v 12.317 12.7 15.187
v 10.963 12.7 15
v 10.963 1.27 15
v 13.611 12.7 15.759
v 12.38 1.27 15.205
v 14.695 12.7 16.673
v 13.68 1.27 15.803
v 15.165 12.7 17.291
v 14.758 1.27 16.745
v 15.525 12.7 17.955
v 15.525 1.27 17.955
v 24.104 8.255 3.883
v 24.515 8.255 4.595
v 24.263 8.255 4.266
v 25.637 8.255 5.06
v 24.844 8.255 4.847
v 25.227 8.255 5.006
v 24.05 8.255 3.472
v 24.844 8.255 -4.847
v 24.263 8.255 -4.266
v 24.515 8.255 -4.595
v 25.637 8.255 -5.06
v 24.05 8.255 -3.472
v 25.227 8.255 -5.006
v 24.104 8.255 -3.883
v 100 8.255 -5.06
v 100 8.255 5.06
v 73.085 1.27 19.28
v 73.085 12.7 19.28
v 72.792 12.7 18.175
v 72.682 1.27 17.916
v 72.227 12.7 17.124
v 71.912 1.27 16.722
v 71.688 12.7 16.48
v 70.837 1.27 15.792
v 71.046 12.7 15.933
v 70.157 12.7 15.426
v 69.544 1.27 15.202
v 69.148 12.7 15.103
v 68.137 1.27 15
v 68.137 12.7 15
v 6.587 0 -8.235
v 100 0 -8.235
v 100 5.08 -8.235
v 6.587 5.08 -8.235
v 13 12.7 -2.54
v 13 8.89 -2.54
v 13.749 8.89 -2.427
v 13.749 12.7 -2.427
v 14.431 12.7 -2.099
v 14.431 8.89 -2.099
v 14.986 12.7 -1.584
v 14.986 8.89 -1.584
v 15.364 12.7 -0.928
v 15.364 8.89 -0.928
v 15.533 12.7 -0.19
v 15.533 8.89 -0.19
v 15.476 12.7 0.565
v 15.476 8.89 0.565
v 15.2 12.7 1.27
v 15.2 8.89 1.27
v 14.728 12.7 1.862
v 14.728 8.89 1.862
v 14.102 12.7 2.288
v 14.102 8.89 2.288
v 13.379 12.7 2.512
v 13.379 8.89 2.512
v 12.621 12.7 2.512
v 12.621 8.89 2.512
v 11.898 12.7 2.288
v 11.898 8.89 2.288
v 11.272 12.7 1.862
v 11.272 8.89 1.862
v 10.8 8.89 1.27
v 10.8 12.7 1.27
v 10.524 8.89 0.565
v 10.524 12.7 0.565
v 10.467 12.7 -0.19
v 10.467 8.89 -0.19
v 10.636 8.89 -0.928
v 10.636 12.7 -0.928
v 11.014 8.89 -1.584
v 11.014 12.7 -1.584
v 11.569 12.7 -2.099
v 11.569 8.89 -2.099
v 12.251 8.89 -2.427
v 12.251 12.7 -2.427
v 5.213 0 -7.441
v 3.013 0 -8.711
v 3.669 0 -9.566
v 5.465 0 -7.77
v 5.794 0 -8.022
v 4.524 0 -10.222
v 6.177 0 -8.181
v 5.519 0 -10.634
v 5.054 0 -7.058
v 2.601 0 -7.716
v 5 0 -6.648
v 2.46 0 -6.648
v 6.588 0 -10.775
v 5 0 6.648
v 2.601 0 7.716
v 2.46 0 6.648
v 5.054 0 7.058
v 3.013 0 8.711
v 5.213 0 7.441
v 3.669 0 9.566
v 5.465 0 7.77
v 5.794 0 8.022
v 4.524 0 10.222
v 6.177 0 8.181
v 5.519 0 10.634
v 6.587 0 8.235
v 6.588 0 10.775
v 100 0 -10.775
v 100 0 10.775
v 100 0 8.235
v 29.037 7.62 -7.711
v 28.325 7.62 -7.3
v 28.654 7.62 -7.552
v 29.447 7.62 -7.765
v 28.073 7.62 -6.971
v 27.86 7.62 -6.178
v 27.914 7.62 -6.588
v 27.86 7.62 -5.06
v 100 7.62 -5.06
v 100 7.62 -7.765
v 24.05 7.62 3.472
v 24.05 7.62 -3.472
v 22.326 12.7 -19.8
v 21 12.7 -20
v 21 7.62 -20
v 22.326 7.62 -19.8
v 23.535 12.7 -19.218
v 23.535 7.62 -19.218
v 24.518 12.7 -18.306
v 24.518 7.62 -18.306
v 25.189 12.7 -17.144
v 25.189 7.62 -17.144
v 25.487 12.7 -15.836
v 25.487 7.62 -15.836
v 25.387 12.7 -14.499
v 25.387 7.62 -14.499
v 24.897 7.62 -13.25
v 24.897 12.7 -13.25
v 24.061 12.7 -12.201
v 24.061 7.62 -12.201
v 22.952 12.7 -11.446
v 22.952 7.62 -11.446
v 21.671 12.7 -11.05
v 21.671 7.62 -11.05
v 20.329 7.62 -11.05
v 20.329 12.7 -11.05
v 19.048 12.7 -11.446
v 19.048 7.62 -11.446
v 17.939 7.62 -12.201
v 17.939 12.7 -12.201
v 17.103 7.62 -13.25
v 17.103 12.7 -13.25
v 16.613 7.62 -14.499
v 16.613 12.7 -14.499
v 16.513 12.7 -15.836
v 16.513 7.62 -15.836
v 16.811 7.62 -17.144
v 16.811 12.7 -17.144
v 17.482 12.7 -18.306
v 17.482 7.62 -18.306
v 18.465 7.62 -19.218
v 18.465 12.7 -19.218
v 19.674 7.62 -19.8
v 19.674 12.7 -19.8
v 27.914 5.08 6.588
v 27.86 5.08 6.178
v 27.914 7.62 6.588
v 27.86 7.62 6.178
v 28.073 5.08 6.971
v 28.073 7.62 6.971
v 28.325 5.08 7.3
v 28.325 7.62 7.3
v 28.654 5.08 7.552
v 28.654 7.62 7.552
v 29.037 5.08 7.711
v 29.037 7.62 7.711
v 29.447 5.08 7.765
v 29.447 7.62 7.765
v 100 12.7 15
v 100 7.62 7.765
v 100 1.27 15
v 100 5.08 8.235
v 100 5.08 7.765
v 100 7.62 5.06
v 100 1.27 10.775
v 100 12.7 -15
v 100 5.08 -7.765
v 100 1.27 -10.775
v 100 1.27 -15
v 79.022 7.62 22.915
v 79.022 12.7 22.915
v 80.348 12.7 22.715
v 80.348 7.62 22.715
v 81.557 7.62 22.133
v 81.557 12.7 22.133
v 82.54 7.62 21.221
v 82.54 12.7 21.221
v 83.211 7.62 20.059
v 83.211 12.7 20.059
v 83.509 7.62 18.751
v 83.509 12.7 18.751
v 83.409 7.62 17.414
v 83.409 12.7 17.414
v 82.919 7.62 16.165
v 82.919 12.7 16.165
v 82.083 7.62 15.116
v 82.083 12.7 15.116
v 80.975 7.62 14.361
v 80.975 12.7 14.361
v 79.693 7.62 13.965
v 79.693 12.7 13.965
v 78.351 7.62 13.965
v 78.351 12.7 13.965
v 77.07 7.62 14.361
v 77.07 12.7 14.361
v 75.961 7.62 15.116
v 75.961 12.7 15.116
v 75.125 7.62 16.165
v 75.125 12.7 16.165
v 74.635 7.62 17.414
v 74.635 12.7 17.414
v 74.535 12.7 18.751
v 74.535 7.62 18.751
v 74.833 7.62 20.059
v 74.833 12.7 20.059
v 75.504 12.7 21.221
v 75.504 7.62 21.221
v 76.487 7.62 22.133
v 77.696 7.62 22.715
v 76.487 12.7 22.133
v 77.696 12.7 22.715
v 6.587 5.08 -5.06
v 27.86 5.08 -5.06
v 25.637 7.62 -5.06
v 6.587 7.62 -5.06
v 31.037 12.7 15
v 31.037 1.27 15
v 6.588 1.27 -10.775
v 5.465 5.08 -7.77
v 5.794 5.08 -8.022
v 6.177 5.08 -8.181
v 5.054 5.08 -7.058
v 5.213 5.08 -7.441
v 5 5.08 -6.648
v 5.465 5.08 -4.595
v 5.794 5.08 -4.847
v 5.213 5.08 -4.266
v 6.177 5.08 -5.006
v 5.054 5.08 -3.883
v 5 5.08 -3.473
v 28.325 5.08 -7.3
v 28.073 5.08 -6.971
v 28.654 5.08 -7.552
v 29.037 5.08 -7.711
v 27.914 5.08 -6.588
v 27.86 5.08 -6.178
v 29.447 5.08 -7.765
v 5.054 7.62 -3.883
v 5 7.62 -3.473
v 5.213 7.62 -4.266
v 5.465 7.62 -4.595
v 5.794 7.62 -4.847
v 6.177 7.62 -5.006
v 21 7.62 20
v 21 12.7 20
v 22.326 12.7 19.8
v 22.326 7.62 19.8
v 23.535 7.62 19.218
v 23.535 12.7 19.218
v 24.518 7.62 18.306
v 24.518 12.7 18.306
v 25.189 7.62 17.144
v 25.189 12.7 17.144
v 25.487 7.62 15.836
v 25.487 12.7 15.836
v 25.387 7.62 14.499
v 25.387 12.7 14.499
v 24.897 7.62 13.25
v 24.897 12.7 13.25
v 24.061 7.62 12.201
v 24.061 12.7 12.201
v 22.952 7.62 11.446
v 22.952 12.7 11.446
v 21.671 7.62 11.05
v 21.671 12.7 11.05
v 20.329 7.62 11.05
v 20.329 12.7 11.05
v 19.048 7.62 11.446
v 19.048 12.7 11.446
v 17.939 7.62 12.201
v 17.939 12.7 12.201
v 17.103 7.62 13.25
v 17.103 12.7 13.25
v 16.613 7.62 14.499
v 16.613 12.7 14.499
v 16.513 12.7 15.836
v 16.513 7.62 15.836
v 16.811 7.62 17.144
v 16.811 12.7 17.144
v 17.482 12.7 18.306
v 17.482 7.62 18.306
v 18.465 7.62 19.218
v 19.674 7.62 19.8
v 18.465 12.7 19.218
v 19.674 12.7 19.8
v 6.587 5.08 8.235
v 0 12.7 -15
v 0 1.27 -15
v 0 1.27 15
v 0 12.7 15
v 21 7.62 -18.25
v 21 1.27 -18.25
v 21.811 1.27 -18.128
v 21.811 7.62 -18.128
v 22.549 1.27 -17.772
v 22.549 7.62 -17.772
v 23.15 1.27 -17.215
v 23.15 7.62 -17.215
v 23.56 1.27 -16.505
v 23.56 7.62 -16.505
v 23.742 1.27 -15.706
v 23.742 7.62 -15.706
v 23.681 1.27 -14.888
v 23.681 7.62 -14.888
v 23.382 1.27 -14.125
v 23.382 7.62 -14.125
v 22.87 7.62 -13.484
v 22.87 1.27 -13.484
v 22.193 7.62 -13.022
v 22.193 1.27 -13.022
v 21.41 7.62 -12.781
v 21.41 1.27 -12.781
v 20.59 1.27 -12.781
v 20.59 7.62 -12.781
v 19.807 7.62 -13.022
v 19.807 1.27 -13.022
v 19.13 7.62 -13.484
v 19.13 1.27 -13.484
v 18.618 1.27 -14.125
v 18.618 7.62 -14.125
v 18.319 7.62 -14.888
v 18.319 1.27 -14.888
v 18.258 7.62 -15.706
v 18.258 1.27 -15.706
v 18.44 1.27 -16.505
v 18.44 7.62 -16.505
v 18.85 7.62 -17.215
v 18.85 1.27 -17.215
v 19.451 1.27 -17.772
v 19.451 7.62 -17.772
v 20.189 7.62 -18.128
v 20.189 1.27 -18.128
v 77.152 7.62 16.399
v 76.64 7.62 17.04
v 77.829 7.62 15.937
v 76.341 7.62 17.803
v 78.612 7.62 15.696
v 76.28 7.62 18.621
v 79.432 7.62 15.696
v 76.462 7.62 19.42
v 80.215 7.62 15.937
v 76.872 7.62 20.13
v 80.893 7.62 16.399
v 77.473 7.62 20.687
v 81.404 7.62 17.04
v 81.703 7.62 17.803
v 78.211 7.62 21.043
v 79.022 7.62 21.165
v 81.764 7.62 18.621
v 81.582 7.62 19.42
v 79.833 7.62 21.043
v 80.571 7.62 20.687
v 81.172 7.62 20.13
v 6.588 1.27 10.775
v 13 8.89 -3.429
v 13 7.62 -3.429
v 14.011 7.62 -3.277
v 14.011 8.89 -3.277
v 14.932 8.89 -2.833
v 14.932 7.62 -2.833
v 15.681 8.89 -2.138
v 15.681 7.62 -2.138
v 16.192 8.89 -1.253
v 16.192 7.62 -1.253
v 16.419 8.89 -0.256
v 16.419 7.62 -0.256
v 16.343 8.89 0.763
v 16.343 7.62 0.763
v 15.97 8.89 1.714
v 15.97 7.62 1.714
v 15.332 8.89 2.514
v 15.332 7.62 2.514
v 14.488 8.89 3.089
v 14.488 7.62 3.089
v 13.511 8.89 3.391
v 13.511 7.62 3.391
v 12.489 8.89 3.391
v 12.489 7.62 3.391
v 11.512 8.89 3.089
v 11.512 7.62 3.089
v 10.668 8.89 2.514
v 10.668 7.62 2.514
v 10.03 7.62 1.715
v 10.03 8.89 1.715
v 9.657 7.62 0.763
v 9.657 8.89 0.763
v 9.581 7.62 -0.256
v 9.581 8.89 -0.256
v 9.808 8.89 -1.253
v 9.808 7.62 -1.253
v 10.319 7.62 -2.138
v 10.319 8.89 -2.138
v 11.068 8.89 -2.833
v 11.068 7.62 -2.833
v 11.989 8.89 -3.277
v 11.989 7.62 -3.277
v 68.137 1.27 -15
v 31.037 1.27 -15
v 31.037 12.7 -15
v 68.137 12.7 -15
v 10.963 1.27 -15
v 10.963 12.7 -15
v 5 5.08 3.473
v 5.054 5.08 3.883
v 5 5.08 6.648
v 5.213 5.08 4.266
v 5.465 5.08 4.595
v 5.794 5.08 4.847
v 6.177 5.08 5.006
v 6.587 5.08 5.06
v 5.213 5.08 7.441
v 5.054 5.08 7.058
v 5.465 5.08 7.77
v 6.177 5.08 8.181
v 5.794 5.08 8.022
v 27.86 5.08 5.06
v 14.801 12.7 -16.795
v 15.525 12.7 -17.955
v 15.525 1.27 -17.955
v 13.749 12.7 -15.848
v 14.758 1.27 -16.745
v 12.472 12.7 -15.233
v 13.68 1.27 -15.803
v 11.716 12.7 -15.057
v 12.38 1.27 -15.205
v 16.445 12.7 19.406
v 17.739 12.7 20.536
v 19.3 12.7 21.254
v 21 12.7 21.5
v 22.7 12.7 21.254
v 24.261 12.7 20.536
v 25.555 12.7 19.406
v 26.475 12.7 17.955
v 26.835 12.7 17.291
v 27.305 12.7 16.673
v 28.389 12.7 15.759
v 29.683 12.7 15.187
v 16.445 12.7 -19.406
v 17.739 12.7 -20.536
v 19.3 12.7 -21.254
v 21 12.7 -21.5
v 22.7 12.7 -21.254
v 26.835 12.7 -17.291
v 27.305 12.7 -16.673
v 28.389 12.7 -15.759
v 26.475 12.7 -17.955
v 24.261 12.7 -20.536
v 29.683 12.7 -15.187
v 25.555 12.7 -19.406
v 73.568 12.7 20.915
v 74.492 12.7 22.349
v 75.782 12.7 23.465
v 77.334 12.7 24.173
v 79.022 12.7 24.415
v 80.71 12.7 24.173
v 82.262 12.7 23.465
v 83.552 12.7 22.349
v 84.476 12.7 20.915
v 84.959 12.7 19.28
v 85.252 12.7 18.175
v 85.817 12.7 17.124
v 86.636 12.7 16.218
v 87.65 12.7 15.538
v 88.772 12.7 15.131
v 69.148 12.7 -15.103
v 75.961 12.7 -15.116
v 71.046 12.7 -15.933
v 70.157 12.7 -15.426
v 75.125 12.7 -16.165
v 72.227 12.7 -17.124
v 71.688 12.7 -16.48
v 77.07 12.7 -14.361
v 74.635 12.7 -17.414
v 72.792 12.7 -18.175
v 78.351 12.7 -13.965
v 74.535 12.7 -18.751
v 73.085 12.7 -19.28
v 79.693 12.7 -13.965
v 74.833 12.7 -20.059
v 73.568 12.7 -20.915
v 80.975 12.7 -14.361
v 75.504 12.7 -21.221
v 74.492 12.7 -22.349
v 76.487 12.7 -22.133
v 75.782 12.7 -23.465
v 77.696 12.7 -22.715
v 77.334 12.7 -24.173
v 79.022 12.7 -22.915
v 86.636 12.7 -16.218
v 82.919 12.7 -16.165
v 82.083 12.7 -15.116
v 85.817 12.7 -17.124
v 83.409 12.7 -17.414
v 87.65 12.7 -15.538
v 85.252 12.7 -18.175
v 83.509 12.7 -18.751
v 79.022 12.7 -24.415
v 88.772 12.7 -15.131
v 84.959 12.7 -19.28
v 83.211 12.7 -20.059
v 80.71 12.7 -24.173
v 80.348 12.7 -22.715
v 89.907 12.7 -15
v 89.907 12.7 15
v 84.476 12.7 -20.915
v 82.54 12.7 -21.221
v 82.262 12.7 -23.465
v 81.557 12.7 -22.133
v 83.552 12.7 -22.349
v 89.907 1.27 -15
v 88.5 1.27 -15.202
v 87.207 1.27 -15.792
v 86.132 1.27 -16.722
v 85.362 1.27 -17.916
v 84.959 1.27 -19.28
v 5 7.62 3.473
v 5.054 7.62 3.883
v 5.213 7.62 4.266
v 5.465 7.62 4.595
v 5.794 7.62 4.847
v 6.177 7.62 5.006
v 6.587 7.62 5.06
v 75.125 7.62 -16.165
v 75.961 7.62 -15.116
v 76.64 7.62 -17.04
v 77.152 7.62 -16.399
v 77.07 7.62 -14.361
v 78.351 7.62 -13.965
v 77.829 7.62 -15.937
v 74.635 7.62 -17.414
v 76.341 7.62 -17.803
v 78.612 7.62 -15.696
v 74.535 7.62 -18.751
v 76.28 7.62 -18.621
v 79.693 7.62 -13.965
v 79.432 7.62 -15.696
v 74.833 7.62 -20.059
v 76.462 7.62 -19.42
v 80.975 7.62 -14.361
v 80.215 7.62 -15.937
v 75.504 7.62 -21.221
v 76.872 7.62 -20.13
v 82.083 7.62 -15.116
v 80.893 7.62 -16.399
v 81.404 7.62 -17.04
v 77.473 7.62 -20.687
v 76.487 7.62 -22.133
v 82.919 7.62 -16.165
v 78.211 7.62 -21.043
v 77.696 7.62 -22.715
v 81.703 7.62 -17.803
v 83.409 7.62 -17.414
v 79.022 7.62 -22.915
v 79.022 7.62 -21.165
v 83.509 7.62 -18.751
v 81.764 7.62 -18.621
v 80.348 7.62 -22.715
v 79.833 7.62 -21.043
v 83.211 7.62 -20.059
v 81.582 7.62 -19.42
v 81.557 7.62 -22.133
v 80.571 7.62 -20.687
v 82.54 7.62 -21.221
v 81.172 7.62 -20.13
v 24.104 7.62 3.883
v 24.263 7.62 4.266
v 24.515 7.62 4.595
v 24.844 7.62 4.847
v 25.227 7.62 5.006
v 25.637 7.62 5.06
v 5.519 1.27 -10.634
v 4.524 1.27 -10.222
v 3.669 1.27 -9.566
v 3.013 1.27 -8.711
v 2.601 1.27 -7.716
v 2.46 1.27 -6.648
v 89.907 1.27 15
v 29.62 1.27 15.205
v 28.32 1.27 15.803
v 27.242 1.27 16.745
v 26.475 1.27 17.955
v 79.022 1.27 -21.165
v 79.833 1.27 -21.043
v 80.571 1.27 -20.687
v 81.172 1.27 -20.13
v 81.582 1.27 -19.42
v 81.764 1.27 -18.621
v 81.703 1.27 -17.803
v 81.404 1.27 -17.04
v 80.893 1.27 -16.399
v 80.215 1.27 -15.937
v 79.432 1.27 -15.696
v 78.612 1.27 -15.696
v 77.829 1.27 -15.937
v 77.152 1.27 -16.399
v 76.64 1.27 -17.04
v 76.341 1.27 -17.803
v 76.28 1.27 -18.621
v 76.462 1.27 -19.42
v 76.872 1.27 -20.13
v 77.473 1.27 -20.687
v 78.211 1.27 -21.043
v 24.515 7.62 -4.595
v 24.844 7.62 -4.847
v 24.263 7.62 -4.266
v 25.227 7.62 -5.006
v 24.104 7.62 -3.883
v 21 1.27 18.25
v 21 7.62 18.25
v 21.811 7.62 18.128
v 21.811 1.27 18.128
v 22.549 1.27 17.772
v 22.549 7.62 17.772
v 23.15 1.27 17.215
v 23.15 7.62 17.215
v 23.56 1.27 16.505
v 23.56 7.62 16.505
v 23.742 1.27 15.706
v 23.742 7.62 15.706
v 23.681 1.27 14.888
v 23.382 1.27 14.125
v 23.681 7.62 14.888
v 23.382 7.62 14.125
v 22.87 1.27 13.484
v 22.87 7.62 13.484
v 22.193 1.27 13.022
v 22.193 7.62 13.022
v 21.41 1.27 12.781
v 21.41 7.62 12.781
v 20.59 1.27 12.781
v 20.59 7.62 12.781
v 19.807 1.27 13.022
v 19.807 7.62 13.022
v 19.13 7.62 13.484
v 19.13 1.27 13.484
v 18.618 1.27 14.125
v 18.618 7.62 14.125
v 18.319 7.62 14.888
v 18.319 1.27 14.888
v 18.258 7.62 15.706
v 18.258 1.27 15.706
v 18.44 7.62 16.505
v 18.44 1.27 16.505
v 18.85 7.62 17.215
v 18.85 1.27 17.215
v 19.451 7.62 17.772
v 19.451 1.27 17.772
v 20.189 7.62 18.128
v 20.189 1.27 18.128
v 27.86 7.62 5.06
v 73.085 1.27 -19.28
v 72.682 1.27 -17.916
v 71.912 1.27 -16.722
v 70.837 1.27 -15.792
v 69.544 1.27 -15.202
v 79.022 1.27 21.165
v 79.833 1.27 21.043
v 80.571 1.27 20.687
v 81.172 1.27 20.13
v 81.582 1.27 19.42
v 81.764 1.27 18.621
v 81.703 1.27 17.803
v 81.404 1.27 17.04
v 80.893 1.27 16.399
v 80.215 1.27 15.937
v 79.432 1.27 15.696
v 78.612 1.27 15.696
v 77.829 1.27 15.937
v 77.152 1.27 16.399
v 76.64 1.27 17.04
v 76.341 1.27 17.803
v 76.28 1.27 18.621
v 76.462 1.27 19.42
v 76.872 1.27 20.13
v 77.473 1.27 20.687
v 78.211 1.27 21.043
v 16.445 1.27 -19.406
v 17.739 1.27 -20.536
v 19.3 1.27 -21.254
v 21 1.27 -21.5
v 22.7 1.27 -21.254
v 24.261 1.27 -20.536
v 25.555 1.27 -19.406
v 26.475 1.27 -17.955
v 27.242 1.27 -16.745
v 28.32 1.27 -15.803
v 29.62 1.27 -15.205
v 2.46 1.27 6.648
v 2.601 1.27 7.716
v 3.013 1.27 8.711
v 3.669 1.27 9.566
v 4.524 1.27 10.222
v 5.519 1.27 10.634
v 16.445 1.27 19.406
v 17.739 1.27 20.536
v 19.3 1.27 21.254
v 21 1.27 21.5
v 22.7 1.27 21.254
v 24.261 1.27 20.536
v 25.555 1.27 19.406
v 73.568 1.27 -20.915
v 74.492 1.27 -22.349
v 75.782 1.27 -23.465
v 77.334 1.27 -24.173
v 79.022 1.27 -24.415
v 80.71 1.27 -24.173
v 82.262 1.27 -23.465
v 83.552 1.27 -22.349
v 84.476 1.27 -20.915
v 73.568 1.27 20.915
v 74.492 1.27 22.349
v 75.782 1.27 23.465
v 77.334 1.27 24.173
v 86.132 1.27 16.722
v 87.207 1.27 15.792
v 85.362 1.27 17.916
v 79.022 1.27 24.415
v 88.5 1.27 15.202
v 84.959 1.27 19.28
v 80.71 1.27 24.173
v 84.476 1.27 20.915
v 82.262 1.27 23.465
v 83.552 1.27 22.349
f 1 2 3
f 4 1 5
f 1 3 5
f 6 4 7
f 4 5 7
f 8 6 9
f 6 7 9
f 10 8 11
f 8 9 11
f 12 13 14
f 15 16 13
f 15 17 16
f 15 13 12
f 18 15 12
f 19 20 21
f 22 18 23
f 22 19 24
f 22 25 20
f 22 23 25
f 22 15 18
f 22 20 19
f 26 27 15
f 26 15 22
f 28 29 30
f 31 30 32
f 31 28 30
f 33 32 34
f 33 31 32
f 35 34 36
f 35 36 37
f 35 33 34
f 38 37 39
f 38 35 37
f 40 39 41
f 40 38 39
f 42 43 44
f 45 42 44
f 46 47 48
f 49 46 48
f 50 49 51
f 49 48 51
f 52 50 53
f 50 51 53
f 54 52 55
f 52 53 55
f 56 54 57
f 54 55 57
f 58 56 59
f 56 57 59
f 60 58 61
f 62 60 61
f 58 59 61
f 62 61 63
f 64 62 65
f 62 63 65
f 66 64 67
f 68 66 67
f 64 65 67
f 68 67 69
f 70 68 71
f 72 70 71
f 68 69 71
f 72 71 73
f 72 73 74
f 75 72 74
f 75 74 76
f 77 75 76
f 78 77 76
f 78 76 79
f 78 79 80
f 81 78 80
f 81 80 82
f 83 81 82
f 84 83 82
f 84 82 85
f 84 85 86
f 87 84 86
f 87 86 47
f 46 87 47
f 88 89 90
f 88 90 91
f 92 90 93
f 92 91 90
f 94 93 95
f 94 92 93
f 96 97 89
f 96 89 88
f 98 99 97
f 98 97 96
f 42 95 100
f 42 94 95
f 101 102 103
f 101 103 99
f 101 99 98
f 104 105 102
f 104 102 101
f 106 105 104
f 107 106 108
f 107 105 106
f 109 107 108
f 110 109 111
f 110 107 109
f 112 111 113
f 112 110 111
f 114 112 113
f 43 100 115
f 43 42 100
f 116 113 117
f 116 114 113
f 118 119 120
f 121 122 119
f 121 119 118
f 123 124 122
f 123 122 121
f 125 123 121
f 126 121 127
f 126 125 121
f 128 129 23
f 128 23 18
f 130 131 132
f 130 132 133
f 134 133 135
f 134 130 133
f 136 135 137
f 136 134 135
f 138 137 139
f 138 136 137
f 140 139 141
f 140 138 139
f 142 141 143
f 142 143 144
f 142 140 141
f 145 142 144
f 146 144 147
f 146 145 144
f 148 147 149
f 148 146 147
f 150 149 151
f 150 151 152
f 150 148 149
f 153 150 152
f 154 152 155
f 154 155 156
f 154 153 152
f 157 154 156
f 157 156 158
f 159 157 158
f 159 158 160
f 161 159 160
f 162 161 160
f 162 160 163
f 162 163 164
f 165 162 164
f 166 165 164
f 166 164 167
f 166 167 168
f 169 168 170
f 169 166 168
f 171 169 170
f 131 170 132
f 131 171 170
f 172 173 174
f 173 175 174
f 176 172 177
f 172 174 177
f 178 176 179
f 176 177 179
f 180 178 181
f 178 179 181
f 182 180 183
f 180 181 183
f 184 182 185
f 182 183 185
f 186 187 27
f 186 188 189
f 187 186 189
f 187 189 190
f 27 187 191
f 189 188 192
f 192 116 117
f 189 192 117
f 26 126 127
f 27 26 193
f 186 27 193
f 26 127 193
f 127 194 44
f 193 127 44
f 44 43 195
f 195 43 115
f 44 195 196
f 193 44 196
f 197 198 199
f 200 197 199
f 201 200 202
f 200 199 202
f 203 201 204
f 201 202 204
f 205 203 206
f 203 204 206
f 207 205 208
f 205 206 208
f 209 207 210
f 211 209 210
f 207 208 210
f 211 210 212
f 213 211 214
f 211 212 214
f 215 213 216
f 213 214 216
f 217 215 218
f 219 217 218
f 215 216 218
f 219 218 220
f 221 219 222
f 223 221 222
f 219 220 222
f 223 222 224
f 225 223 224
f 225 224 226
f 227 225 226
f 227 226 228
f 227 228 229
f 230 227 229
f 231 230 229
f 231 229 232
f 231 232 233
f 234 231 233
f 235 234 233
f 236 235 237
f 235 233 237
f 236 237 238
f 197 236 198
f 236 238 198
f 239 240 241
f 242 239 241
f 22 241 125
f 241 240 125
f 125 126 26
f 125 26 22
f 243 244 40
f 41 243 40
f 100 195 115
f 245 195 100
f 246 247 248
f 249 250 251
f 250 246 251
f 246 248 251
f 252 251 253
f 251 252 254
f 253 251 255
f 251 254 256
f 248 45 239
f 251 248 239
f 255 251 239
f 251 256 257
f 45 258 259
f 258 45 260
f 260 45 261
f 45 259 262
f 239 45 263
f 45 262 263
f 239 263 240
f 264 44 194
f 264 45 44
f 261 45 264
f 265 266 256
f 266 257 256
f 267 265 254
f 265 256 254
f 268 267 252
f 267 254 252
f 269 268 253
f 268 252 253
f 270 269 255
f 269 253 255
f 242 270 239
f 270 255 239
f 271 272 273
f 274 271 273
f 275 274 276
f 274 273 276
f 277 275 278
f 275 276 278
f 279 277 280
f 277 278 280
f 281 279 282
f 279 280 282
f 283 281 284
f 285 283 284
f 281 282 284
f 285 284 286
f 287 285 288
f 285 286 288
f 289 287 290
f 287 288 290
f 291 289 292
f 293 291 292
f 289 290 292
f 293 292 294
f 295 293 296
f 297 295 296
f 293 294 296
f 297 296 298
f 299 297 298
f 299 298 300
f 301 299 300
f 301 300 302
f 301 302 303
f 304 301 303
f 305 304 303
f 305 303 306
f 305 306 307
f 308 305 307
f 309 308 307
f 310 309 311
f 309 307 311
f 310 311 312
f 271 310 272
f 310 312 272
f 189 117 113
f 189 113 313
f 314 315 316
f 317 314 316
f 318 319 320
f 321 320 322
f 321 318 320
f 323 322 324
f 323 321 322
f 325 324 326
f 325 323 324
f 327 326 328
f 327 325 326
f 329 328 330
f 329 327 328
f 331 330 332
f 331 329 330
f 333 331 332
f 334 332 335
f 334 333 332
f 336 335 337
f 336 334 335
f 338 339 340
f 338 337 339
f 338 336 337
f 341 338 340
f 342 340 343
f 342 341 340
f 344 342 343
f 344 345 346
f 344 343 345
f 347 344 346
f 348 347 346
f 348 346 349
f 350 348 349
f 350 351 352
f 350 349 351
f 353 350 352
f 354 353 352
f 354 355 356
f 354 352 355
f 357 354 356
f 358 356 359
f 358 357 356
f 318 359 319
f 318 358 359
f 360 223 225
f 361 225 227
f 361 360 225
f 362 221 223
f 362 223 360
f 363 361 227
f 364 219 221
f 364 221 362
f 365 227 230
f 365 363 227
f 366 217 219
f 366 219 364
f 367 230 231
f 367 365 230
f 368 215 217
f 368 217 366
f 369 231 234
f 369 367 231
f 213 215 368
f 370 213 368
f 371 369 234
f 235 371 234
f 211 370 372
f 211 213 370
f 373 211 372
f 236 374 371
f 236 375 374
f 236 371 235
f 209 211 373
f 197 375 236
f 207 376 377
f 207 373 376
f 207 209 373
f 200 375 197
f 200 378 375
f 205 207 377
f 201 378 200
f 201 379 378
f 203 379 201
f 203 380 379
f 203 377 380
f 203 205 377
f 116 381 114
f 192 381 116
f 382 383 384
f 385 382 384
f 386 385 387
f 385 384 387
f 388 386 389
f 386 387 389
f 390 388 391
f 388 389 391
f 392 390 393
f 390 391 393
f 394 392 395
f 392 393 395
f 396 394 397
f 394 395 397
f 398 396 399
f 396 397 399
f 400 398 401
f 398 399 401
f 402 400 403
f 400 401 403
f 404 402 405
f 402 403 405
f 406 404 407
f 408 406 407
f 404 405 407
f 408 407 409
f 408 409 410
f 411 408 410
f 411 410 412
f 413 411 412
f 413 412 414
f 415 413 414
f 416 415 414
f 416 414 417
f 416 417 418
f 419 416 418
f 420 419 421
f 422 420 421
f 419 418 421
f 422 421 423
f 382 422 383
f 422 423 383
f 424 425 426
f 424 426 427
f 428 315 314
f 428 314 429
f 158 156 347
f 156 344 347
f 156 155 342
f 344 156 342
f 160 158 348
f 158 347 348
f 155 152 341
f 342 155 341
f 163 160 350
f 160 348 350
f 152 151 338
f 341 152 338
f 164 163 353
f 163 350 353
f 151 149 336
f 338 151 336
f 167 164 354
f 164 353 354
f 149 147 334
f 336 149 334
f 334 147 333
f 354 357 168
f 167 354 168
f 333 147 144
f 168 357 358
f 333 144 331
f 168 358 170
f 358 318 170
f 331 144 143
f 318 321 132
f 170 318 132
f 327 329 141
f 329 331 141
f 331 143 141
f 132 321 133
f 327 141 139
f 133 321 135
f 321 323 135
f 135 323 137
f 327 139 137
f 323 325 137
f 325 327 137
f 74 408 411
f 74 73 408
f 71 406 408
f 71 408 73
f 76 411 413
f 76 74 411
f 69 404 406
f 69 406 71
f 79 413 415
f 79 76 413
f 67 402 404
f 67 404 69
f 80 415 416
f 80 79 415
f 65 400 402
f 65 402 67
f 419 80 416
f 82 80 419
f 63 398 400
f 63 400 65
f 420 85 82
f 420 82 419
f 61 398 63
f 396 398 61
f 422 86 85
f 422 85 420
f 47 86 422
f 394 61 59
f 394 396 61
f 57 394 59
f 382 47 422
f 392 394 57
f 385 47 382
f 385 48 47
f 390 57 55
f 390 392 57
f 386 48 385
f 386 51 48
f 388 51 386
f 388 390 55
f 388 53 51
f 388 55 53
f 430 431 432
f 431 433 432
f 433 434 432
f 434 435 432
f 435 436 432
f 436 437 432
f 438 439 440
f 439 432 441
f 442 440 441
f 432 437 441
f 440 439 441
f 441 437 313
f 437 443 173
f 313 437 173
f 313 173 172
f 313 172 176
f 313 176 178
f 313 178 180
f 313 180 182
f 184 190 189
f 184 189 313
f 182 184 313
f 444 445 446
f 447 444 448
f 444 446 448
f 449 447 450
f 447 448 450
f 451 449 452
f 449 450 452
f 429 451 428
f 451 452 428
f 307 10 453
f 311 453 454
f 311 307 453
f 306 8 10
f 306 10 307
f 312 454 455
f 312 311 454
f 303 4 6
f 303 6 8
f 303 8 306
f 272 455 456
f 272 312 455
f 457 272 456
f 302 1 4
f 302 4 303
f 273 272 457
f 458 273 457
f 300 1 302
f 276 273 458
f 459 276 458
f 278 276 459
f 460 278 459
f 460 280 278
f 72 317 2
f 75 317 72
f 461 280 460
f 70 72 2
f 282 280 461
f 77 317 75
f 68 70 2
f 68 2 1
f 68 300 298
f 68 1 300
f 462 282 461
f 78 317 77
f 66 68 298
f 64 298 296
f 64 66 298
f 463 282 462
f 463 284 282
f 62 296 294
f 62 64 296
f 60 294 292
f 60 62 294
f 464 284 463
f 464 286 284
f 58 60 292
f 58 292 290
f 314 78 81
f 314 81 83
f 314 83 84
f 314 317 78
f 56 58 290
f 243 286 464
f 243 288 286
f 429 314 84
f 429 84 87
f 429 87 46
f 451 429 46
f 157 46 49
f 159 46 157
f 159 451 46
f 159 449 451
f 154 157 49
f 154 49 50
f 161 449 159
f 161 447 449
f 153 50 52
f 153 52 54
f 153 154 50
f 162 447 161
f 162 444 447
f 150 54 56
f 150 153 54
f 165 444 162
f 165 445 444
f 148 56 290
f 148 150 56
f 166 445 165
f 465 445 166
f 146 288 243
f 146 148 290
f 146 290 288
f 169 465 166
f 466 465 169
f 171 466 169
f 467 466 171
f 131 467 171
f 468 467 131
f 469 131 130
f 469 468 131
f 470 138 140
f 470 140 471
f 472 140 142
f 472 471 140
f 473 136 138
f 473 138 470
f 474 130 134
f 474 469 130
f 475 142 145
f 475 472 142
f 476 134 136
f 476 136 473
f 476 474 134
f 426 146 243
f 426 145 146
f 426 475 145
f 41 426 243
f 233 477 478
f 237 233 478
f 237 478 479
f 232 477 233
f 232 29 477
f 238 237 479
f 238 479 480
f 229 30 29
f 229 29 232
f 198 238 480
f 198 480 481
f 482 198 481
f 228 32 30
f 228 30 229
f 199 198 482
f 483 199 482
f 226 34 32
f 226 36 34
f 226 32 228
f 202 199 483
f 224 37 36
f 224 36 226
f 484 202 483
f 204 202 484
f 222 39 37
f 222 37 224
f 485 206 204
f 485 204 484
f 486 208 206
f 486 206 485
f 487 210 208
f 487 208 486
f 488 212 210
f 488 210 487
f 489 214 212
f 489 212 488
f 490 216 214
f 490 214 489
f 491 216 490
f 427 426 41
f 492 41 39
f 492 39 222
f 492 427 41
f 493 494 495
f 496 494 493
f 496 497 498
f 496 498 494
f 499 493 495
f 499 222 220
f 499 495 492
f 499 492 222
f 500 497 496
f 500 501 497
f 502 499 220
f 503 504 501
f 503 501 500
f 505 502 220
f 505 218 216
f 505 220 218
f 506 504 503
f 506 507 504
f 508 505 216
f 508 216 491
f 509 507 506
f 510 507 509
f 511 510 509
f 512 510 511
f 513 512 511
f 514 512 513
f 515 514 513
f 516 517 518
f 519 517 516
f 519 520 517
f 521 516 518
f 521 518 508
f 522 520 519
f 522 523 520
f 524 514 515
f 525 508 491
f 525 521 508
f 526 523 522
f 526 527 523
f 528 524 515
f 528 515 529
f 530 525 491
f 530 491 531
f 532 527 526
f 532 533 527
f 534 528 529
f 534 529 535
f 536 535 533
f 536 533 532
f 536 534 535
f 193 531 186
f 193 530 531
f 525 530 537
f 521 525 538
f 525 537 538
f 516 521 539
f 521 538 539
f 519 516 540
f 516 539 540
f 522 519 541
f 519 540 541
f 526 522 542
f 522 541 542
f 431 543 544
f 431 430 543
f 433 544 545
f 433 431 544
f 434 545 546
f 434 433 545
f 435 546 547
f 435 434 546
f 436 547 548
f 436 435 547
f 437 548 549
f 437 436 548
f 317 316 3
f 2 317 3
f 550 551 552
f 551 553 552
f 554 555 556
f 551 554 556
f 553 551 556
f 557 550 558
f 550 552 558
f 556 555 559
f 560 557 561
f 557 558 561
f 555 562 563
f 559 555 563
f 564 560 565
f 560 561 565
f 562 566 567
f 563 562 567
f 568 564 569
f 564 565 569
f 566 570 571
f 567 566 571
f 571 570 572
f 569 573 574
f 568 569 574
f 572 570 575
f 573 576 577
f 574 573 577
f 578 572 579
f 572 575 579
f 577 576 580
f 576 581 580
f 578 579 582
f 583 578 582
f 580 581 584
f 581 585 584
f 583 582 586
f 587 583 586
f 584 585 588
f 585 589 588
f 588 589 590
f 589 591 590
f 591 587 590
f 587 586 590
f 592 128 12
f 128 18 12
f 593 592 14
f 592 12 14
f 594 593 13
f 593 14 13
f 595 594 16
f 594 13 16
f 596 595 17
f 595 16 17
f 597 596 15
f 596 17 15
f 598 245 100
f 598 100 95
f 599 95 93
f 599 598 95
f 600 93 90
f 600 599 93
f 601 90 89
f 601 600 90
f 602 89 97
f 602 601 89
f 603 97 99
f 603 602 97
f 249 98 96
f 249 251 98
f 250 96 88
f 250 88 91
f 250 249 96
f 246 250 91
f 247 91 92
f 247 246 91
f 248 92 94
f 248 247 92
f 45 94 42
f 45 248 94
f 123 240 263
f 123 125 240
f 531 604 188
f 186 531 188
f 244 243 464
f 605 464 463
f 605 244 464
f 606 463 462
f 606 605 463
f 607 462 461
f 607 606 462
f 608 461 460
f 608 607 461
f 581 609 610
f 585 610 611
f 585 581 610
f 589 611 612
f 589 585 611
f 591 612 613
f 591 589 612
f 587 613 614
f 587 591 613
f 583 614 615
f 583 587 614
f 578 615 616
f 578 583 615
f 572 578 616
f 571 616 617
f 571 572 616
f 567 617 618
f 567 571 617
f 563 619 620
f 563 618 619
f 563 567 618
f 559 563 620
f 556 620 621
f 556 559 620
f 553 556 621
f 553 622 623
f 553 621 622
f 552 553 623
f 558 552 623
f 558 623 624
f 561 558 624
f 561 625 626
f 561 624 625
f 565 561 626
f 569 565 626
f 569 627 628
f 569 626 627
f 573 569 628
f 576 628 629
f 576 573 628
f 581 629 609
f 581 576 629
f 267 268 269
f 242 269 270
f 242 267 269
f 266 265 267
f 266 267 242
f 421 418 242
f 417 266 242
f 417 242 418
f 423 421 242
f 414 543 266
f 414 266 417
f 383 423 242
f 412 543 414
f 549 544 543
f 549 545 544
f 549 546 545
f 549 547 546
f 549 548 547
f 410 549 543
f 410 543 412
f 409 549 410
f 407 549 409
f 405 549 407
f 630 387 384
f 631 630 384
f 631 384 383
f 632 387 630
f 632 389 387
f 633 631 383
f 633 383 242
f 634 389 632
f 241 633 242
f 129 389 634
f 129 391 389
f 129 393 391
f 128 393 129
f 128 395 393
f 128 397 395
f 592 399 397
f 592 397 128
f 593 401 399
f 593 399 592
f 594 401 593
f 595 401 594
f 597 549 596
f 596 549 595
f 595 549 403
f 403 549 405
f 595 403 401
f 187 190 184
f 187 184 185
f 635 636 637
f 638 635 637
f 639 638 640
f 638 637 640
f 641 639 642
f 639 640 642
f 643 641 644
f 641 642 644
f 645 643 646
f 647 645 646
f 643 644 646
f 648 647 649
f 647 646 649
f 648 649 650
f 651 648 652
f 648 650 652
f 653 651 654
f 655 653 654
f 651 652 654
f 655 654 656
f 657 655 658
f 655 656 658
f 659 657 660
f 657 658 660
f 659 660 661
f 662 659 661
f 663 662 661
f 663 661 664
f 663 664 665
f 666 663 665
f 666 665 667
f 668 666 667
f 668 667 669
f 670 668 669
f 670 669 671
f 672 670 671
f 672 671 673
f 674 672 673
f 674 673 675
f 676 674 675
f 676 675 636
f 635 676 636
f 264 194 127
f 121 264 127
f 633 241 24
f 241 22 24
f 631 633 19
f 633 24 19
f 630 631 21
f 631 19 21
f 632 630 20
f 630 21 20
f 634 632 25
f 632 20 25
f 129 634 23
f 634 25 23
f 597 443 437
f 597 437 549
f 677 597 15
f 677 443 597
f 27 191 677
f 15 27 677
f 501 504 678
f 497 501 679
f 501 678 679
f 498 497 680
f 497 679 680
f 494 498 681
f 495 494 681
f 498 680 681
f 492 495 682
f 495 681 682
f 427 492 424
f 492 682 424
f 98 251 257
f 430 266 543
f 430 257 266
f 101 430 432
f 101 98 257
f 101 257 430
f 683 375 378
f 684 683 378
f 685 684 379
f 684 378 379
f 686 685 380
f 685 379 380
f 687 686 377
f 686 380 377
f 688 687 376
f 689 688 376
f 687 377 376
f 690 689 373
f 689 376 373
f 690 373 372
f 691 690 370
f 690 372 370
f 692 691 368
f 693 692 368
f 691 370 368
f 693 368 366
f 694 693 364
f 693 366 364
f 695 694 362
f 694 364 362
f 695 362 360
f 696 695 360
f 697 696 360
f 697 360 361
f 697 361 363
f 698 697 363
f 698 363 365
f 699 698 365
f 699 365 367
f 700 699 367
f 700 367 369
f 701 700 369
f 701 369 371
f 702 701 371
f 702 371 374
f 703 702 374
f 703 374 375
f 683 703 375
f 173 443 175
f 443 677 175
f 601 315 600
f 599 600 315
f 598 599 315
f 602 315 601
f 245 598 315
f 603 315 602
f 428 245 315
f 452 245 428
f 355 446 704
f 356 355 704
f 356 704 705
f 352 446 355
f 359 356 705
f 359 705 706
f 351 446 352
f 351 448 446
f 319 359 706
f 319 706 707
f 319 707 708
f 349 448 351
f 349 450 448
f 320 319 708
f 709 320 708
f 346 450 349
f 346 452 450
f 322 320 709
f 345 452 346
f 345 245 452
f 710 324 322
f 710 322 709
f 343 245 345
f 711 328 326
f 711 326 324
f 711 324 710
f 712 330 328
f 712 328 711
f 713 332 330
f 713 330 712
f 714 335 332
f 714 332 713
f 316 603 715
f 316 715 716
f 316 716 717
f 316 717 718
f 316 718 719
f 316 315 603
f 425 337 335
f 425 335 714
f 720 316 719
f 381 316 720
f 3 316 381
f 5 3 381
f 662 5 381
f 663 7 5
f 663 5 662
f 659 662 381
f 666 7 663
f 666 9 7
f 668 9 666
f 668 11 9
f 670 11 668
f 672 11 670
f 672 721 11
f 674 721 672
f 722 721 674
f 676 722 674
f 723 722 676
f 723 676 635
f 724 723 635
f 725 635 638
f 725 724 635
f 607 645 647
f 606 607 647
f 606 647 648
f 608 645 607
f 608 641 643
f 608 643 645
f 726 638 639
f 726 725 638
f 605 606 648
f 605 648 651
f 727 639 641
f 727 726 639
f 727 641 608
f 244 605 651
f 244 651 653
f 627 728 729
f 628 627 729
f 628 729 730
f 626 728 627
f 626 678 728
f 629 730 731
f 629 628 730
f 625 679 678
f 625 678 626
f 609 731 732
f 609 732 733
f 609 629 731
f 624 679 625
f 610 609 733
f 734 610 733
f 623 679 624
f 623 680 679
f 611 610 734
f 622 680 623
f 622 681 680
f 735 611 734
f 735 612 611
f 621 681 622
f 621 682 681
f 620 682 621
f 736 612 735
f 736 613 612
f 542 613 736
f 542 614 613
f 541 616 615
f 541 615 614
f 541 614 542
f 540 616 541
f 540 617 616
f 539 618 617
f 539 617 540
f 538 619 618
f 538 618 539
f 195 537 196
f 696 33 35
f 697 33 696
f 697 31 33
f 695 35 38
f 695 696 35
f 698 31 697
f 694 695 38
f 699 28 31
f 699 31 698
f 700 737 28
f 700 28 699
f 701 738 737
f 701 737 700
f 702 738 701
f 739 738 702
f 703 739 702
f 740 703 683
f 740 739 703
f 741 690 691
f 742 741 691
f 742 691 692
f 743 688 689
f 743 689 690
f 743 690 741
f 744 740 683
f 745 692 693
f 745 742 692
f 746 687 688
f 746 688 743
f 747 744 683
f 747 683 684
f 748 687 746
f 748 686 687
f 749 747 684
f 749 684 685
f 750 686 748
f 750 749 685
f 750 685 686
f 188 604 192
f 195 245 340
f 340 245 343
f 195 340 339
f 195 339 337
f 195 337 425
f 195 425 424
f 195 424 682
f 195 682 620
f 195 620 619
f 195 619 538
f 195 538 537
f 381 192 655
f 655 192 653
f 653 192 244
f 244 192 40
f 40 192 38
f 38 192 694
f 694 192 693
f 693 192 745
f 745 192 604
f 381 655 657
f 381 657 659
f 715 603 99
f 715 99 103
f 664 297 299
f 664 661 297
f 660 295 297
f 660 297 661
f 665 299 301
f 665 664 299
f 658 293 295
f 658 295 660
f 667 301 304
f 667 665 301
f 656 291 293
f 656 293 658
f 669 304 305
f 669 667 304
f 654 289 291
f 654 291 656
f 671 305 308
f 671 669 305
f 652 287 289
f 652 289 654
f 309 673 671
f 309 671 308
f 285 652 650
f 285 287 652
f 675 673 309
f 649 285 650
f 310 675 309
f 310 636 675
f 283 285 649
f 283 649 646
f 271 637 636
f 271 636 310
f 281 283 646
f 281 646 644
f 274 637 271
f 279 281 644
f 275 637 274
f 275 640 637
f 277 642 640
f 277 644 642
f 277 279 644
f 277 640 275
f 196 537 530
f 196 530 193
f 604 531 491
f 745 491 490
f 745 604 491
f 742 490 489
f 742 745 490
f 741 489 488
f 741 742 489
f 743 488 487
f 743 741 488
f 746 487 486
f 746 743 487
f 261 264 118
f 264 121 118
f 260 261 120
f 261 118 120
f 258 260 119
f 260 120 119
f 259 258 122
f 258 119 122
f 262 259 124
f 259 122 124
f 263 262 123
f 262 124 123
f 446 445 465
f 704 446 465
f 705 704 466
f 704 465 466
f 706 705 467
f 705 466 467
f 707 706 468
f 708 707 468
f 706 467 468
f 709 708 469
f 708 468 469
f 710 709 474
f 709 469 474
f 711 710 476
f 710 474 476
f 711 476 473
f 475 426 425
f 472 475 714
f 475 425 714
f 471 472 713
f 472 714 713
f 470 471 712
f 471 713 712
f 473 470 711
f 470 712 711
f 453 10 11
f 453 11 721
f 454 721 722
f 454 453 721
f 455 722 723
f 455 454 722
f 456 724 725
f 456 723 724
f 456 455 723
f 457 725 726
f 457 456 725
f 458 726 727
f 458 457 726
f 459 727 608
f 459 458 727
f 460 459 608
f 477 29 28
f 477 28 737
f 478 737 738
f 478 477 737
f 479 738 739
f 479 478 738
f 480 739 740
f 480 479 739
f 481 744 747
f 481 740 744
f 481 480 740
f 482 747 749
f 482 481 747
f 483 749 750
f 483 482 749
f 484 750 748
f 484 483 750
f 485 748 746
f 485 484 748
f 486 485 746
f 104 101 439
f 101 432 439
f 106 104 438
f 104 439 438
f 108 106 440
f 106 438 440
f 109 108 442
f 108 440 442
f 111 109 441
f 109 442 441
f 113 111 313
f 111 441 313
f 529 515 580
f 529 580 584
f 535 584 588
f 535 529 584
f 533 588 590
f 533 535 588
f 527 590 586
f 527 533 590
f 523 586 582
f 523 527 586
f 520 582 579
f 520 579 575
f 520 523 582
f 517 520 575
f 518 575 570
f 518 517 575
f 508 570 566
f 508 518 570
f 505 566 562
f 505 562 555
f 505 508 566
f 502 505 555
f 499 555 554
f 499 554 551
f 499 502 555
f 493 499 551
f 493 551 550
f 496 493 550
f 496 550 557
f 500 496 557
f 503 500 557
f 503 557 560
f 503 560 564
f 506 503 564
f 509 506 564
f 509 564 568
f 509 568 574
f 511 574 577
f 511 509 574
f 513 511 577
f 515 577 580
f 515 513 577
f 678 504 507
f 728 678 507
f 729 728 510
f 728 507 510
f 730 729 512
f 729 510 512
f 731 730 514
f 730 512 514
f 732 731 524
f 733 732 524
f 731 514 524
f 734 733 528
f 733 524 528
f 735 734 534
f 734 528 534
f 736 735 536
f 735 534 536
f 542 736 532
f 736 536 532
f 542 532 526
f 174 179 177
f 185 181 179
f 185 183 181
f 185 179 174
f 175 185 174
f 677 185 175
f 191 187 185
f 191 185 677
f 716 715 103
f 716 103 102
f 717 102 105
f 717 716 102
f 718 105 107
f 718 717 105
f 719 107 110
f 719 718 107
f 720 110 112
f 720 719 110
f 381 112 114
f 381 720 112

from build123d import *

# Parameters (mm, degrees)
SKETCH1_W           = 100
SKETCH1_H           = 30
BOSS_EXTRUDE1_DEPTH = 12.7
SKETCH2_W           = 15.2
SKETCH2_H           = 7.62
CUT_EXTRUDE1_DEPTH  = 102.913149299
SKETCH3_W           = 0.635
SKETCH3_H           = 5.08
SKETCH3_W_2         = 10.12
SKETCH3_H_2         = 0.635
CUT_EXTRUDE2_DEPTH  = 102.913149299
BOSS_EXTRUDE2_REACH = 103.913
SKETCH4_W           = 5
SKETCH4_H           = 16.47
FILLET7_R           = 1.5875
FILLET8_R           = 1.5875
BOSS_EXTRUDE3_REACH = 103.405
SKETCH9_W           = 19.05
SKETCH9_H           = 10.12
SKETCH7_R           = 2.54
CUT_EXTRUDE4_DEPTH  = 102.405445613
SKETCH10_R          = 3.429
CUT_EXTRUDE6_DEPTH  = 1.27
FILLET5_R           = 1.5875
BOSS_EXTRUDE4_DEPTH = 12.7
SKETCH12_R          = 4.5
CUT_EXTRUDE7_DEPTH  = 5.08
SKETCH13_R          = 2.75
CUT_EXTRUDE8_DEPTH  = 104.218974152
FILLET6_R           = 5
CUT_EXTRUDE9_START  = -1.27
CUT_EXTRUDE9_DEPTH  = 1.27
SKETCH25_W          = 3.175
SKETCH25_H          = 2.54
BOSS_EXTRUDE5_DEPTH = 2.54
BOSS_EXTRUDE6_REACH = 82.186
SKETCH26_W          = 2.54
SKETCH26_H          = 2.54
SKETCH31_W          = 0.1651
SKETCH31_H          = 2.54
ADJUST_DEPTH        = 72.14
FILLET9_R           = 1.5875


with BuildPart() as part:
    # Sketch1 → Boss-Extrude1 (new body)
    with BuildSketch(Plane(origin=(0, 0, 0), x_dir=(1, 0, 0), z_dir=(0, 1, 0))):
        with Locations((50, 0)):
            Rectangle(SKETCH1_W, SKETCH1_H)
    extrude(amount=BOSS_EXTRUDE1_DEPTH)

    # Sketch2 → Cut-Extrude1 (cut, through all)
    with BuildSketch(Plane(origin=(100, 0, 0), x_dir=(0, 0, -1), z_dir=(1, 0, 0))):
        with Locations((0, 3.81)):
            Rectangle(SKETCH2_W, SKETCH2_H)
    extrude(amount=-CUT_EXTRUDE1_DEPTH, mode=Mode.SUBTRACT)

    # Sketch3 → Cut-Extrude2 (cut, through all)
    with BuildSketch(Plane(origin=(100, 0, 0), x_dir=(0, 0, -1), z_dir=(1, 0, 0))):
        with Locations((-7.9175, 2.54)):
            Rectangle(SKETCH3_W, SKETCH3_H)
        with Locations((0, 7.9375)):
            Rectangle(SKETCH3_W_2, SKETCH3_H_2)
        with Locations((7.9175, 2.54)):
            Rectangle(SKETCH3_W, SKETCH3_H)
    extrude(amount=-CUT_EXTRUDE2_DEPTH, mode=Mode.SUBTRACT)

    # Sketch4 → Boss-Extrude2 (add, up to next)
    with BuildSketch(Plane.XZ, mode=Mode.PRIVATE) as boss_extrude2_sk1:
        with Locations((2.5, 0)):
            Rectangle(SKETCH4_W, SKETCH4_H)
    boss_extrude2_tool1 = extrude(boss_extrude2_sk1.sketch, amount=-BOSS_EXTRUDE2_REACH, mode=Mode.PRIVATE) - part.part
    add(boss_extrude2_tool1.solids().sort_by_distance((2.5, 0, 0))[0])

    # Fillet7
    fillet7_edges = [part.edges().sort_by_distance(p)[0] for p in [
        (5, 6.35, 7.6),
        (5, 6.35, -7.6),
    ]]
    fillet(fillet7_edges, radius=FILLET7_R)

    # Fillet8
    fillet8_edges = [part.edges().sort_by_distance(p)[0] for p in [
        (5, 2.54, 8.235),
        (5, 2.54, -8.235),
    ]]
    fillet(fillet8_edges, radius=FILLET8_R)

    # Sketch9 → Boss-Extrude3 (add, up to next)
    with BuildSketch(Plane.XZ.offset(-7.62), mode=Mode.PRIVATE) as boss_extrude3_sk1:
        with Locations((14.525, 0)):
            Rectangle(SKETCH9_W, SKETCH9_H)
    boss_extrude3_tool1 = extrude(boss_extrude3_sk1.sketch, amount=-BOSS_EXTRUDE3_REACH, mode=Mode.PRIVATE) - part.part
    add(boss_extrude3_tool1.solids().sort_by_distance((14.525, 7.62, 0))[0])

    # Sketch7 → Cut-Extrude4 (cut, through all)
    with BuildSketch(Plane.XZ.offset(-7.62)):
        with Locations(Location((13, 0, 0), (0, 0, 270))):
            Circle(SKETCH7_R)
    extrude(amount=-CUT_EXTRUDE4_DEPTH, mode=Mode.SUBTRACT)

    # Sketch10 → Cut-Extrude6 (cut)
    with BuildSketch(Plane.XZ.offset(-7.62)):
        with Locations(Location((13, 0, 0), (0, 0, 270))):
            Circle(SKETCH10_R)
    extrude(amount=-CUT_EXTRUDE6_DEPTH, mode=Mode.SUBTRACT)

    # Fillet5
    fillet5_edges = [part.edges().sort_by_distance(p)[0] for p in [
        (24.05, 7.9375, 5.06),
        (24.05, 7.9375, -5.06),
    ]]
    fillet(fillet5_edges, radius=FILLET5_R)

    # Sketch11 → Boss-Extrude4 (add)
    with BuildSketch(Plane(origin=(0, 12.7, 0), x_dir=(1, 0, 0), z_dir=(0, 1, 0))):
        with BuildLine():
            Line((73, -15), (73.022061133, -18.415))
            ThreePointArc((73.022061133, -18.415), (79.022061133, -24.415), (85.022061133, -18.415))
            Line((85.022061133, -18.415), (85, -15))
            Line((85, -15), (73, -15))
        make_face()
        with BuildLine():
            Line((27, -15.5), (27, -15))
            Line((27, -15), (15, -15))
            Line((15, -15), (15, -15.5))
            ThreePointArc((15, -15.5), (21, -21.5), (27, -15.5))
        make_face()
    boss_extrude4 = extrude(amount=-BOSS_EXTRUDE4_DEPTH)

    # Sketch12 → Cut-Extrude7 (cut)
    with BuildSketch(Plane(origin=(0, 12.7, 0), x_dir=(1, 0, 0), z_dir=(0, 1, 0))):
        with Locations(Location((21, -15.5, 0), (0, 0, 270))):
            Circle(SKETCH12_R)
        with Locations(Location((79.022061133, -18.415, 0), (0, 0, 270))):
            Circle(SKETCH12_R)
    cut_extrude7 = extrude(amount=-CUT_EXTRUDE7_DEPTH, mode=Mode.SUBTRACT)

    # Sketch13 → Cut-Extrude8 (cut, through all)
    with BuildSketch(Plane(origin=(0, 7.62, 0), x_dir=(1, 0, 0), z_dir=(0, 1, 0))):
        with Locations(Location((21, -15.5, 0), (0, 0, 270))):
            Circle(SKETCH13_R)
        with Locations(Location((79.022061133, -18.415, 0), (0, 0, 270))):
            Circle(SKETCH13_R)
    cut_extrude8 = extrude(amount=-CUT_EXTRUDE8_DEPTH, mode=Mode.SUBTRACT)

    # Mirror1: Boss-Extrude4, Cut-Extrude7, Cut-Extrude8 across plane
    add(boss_extrude4.mirror(Plane.XY))
    add(cut_extrude7.mirror(Plane.XY), mode=Mode.SUBTRACT)
    add(cut_extrude8.mirror(Plane.XY), mode=Mode.SUBTRACT)

    # Fillet6
    fillet6_edges = [part.edges().sort_by_distance(p)[0] for p in [
        (15, 6.35, 15),
        (27, 6.35, 15),
        (73, 6.35, 15),
        (85, 6.35, 15),
        (85, 6.35, -15),
        (73, 6.35, -15),
        (15, 6.35, -15),
        (27, 6.35, -15),
    ]]
    fillet(fillet6_edges, radius=FILLET6_R)

    # Sketch24 → Cut-Extrude9 (cut)
    with BuildSketch(Plane.XZ.offset(CUT_EXTRUDE9_START)):
        with BuildLine():
            Line((100, -10.775), (6.5875, -10.775))
            ThreePointArc((6.5875, -10.775), (3.668916761, -9.566083239), (2.46, -6.6475))
            Line((2.46, -6.6475), (2.46, 6.6475))
            ThreePointArc((2.46, 6.6475), (3.668916761, 9.566083239), (6.5875, 10.775))
            Line((6.5875, 10.775), (100, 10.775))
            Line((100, 10.775), (100, 15))
            Line((100, 15), (89.907270135, 15))
            ThreePointArc((89.907270135, 15), (86.636358391, 16.218315671), (84.959447861, 19.279545455))
            ThreePointArc((84.959447861, 19.279545455), (79.022061133, 24.415), (73.084674406, 19.279545455))
            ThreePointArc((73.084674406, 19.279545455), (71.407763876, 16.218315671), (68.136852132, 15))
            Line((68.136852132, 15), (31.03742995, 15))
            ThreePointArc((31.03742995, 15), (28.319643417, 15.803139702), (26.474961791, 17.954545455))
            ThreePointArc((26.474961791, 17.954545455), (21, 21.5), (15.525038209, 17.954545455))
            ThreePointArc((15.525038209, 17.954545455), (13.680356583, 15.803139702), (10.96257005, 15))
            Line((10.96257005, 15), (0, 15))
            Line((0, 15), (0, -15))
            Line((0, -15), (10.96257005, -15))
            ThreePointArc((10.96257005, -15), (13.680356583, -15.803139702), (15.525038209, -17.954545455))
            ThreePointArc((15.525038209, -17.954545455), (21, -21.5), (26.474961791, -17.954545455))
            ThreePointArc((26.474961791, -17.954545455), (28.319643417, -15.803139702), (31.03742995, -15))
            Line((31.03742995, -15), (68.136852132, -15))
            ThreePointArc((68.136852132, -15), (71.407763876, -16.218315671), (73.084674406, -19.279545455))
            ThreePointArc((73.084674406, -19.279545455), (79.022061133, -24.415), (84.959447861, -19.279545455))
            ThreePointArc((84.959447861, -19.279545455), (86.636358391, -16.218315671), (89.907270135, -15))
            Line((89.907270135, -15), (100, -15))
            Line((100, -15), (100, -10.775))
        make_face()
    extrude(amount=CUT_EXTRUDE9_DEPTH, mode=Mode.SUBTRACT)

    # Sketch25 → Boss-Extrude5 (add)
    with BuildSketch(Plane.XZ.offset(-7.62)):
        with Locations((26.2725, 6.33)):
            Rectangle(SKETCH25_W, SKETCH25_H)
        with Locations((26.2725, -6.33)):
            Rectangle(SKETCH25_W, SKETCH25_H)
    extrude(amount=BOSS_EXTRUDE5_DEPTH)

    # Sketch26 → Boss-Extrude6 (add, up to next)
    with BuildSketch(Plane.ZY.offset(-24.685), mode=Mode.PRIVATE) as boss_extrude6_sk1:
        with Locations((6.33, 6.35)):
            Rectangle(SKETCH26_W, SKETCH26_H)
    boss_extrude6_tool1 = extrude(boss_extrude6_sk1.sketch, amount=BOSS_EXTRUDE6_REACH, mode=Mode.PRIVATE) - part.part
    # Sketch26 → Boss-Extrude6 (add, up to next)
    with BuildSketch(Plane.ZY.offset(-24.685), mode=Mode.PRIVATE) as boss_extrude6_sk2:
        with Locations((-6.33, 6.35)):
            Rectangle(SKETCH26_W, SKETCH26_H)
    boss_extrude6_tool2 = extrude(boss_extrude6_sk2.sketch, amount=BOSS_EXTRUDE6_REACH, mode=Mode.PRIVATE) - part.part
    add(boss_extrude6_tool1.solids().sort_by_distance((24.685, 6.35, 6.33))[0])
    add(boss_extrude6_tool2.solids().sort_by_distance((24.685, 6.35, -6.33))[0])

    # Sketch31 → adjust (cut)
    with BuildSketch(Plane(origin=(100, 0, 0), x_dir=(0, 0, -1), z_dir=(1, 0, 0))):
        with Locations((7.68255, 6.35)):
            Rectangle(SKETCH31_W, SKETCH31_H)
        with Locations((-7.68255, 6.35)):
            Rectangle(SKETCH31_W, SKETCH31_H)
    extrude(amount=-ADJUST_DEPTH, mode=Mode.SUBTRACT)

    # Fillet9
    fillet9_edges = [part.edges().sort_by_distance(p)[0] for p in [
        (5, 6.35, 5.06),
        (5, 6.35, -5.06),
        (27.86, 6.35, 7.7651),
        (27.86, 6.35, -7.7651),
    ]]
    fillet(fillet9_edges, radius=FILLET9_R)


solid = part.part
